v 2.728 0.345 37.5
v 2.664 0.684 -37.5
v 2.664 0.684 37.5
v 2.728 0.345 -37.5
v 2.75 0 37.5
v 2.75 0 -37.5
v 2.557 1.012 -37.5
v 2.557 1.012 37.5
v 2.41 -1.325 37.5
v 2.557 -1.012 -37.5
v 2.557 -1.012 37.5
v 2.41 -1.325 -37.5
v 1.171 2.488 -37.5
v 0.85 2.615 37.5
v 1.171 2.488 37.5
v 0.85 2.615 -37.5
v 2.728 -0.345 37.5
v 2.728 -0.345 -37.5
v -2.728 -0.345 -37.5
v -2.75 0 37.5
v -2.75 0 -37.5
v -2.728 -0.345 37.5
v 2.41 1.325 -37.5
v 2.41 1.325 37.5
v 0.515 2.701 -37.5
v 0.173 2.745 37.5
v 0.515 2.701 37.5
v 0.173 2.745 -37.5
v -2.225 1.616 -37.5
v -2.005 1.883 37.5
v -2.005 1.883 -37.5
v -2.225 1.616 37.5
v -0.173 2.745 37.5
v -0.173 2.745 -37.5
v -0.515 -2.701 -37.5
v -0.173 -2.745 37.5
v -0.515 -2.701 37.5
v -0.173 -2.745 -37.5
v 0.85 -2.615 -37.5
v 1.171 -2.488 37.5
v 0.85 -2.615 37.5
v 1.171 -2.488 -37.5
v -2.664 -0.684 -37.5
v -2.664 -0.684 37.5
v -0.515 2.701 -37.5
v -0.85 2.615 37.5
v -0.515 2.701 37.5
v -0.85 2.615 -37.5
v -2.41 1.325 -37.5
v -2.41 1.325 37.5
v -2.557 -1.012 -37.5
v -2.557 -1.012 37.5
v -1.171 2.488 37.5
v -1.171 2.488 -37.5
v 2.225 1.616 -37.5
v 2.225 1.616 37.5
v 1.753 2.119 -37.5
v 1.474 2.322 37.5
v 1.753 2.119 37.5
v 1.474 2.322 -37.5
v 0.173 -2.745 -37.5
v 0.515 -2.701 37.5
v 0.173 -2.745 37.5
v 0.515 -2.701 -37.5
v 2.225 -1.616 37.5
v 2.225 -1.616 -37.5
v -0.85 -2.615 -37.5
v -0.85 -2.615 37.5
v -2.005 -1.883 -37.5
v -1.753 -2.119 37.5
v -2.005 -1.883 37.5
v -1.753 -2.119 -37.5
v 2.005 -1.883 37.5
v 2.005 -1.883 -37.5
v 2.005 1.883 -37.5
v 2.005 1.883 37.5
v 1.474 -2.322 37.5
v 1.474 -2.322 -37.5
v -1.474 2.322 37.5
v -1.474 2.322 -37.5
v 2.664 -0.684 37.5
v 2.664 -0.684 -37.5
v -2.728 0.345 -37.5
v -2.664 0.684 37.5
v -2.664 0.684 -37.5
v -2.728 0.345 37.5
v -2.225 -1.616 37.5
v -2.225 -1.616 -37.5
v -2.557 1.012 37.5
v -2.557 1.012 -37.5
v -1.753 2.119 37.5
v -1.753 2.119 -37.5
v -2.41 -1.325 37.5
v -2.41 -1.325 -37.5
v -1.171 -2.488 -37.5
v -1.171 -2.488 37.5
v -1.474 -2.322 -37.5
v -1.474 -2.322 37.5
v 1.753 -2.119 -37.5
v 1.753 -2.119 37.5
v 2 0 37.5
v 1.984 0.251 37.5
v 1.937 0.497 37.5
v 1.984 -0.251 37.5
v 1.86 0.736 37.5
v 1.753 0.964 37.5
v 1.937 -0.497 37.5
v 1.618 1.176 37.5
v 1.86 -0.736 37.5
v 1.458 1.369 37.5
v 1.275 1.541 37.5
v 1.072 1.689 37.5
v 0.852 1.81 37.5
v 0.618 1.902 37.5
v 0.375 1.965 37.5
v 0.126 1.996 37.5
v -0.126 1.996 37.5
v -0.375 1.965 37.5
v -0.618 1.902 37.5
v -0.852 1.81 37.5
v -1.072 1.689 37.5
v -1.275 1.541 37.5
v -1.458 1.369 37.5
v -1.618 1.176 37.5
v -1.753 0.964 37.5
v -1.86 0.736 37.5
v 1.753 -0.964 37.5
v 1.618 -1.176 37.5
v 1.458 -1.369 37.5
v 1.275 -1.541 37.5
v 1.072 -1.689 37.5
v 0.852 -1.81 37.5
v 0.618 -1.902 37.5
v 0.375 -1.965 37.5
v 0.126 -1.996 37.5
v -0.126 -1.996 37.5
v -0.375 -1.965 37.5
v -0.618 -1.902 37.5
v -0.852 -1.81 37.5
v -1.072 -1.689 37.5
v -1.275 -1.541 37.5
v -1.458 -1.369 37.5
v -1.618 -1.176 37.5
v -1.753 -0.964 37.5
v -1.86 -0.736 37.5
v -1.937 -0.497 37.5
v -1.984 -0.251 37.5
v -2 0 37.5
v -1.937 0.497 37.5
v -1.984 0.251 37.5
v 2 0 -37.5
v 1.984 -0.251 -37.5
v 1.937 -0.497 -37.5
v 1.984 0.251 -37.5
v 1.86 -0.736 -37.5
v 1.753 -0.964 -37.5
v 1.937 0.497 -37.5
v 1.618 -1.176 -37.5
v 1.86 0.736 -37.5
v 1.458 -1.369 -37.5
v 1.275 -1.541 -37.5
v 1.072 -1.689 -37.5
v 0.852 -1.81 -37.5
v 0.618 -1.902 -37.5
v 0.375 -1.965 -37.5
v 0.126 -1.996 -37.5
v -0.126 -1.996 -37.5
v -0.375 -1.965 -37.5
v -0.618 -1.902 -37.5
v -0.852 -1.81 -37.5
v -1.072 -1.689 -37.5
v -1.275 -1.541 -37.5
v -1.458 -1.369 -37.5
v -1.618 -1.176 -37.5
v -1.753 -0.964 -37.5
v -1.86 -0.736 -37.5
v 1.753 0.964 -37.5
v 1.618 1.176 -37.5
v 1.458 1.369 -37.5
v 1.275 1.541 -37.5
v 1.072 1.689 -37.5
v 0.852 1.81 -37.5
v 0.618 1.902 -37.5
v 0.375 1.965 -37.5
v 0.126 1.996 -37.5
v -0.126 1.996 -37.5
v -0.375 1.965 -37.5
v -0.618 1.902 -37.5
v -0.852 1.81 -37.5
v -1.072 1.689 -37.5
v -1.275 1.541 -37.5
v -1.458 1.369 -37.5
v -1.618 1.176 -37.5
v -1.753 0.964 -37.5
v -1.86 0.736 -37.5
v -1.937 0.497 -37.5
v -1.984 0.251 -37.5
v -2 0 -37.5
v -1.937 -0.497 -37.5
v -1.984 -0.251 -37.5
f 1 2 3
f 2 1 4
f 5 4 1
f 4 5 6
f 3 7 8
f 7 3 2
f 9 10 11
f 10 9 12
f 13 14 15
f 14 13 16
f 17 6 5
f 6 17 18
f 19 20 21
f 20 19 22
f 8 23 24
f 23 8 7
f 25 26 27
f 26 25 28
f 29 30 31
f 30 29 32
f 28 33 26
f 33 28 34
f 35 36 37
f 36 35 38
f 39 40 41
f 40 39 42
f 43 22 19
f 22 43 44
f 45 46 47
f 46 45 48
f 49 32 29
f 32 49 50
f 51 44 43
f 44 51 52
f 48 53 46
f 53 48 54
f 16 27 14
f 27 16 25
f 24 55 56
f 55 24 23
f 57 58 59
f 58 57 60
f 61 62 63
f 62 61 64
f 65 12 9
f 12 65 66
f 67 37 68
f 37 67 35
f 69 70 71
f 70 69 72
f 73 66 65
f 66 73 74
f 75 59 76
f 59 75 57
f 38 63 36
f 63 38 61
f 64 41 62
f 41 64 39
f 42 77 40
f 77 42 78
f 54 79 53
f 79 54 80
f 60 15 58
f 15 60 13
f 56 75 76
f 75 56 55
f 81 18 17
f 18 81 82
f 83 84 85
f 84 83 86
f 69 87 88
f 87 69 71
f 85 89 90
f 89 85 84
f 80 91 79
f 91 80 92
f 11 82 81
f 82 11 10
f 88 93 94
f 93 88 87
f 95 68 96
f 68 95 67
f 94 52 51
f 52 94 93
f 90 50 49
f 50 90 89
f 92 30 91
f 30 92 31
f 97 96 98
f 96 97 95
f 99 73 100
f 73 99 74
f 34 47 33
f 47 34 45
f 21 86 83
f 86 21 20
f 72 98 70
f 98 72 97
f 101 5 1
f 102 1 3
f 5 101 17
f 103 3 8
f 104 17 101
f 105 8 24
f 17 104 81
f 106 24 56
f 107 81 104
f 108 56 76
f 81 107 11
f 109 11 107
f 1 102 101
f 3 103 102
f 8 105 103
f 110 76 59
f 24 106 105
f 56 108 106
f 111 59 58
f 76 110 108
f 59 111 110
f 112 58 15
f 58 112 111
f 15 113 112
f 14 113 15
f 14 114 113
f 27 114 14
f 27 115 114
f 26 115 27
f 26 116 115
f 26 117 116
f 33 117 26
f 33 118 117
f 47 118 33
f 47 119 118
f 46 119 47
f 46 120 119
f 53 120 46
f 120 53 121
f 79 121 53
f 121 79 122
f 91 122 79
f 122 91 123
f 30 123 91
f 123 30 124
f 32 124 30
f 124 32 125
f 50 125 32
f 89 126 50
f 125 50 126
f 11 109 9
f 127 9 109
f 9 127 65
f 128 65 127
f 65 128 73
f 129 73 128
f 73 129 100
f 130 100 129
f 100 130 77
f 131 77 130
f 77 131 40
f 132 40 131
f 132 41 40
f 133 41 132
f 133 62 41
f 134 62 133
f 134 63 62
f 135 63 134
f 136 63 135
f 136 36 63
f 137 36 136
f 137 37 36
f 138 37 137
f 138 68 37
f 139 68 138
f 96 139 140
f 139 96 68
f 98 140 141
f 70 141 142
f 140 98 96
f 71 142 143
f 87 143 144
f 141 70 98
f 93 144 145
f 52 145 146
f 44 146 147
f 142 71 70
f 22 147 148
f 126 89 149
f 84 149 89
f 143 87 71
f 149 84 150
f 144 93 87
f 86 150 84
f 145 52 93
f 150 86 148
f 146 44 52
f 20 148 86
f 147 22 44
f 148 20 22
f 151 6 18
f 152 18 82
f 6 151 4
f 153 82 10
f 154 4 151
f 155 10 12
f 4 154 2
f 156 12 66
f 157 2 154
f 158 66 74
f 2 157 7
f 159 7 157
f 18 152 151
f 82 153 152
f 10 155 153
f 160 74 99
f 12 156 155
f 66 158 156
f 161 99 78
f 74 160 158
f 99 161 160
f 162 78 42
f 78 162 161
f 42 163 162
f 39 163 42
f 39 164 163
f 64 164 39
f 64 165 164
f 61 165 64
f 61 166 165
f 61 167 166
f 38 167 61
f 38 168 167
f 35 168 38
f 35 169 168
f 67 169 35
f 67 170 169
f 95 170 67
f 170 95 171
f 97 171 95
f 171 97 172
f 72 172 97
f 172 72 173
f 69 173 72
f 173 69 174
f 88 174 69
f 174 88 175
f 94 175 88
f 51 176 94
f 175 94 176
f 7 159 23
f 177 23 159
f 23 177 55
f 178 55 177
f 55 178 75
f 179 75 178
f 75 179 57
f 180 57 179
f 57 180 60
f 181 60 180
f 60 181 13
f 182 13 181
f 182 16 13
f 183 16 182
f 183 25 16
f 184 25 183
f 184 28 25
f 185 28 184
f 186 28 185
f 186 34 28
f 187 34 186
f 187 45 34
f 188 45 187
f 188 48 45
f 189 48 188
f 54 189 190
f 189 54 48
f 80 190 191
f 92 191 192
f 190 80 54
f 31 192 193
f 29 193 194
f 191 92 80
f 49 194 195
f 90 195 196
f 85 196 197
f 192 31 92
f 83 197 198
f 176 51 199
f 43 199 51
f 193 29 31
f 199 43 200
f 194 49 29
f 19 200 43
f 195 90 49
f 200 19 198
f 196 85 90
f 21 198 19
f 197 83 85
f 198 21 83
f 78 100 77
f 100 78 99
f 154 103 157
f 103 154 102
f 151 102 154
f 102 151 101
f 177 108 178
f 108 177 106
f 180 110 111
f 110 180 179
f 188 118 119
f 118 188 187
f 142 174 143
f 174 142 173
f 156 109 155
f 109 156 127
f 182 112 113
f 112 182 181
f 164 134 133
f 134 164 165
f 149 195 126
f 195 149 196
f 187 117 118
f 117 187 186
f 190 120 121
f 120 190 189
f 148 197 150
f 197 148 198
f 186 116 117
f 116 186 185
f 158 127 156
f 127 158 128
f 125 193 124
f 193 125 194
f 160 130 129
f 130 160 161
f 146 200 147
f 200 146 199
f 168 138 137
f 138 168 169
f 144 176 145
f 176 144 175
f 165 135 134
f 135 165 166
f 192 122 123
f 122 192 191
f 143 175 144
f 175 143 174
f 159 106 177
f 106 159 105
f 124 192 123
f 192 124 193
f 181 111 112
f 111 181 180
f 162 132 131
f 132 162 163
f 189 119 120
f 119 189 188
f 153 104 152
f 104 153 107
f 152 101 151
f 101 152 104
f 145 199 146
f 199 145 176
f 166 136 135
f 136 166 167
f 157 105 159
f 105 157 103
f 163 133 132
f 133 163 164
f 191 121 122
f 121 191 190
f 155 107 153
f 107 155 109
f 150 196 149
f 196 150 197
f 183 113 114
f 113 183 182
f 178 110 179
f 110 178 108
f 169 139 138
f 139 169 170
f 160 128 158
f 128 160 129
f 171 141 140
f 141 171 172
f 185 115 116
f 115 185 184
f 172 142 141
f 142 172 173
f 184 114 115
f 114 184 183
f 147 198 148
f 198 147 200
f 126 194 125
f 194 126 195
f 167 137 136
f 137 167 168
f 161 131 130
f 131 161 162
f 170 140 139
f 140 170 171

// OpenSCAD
$fn = 50;


difference() {
	union() {
		translate(v = [0, 0, -37.5000000000]) {
			cylinder(h = 75, r = 2.7500000000);
		}
	}
	union() {
		translate(v = [0, 0, -100.0000000000]) {
			cylinder(h = 200, r = 2.0000000000);
		}
	}
}
